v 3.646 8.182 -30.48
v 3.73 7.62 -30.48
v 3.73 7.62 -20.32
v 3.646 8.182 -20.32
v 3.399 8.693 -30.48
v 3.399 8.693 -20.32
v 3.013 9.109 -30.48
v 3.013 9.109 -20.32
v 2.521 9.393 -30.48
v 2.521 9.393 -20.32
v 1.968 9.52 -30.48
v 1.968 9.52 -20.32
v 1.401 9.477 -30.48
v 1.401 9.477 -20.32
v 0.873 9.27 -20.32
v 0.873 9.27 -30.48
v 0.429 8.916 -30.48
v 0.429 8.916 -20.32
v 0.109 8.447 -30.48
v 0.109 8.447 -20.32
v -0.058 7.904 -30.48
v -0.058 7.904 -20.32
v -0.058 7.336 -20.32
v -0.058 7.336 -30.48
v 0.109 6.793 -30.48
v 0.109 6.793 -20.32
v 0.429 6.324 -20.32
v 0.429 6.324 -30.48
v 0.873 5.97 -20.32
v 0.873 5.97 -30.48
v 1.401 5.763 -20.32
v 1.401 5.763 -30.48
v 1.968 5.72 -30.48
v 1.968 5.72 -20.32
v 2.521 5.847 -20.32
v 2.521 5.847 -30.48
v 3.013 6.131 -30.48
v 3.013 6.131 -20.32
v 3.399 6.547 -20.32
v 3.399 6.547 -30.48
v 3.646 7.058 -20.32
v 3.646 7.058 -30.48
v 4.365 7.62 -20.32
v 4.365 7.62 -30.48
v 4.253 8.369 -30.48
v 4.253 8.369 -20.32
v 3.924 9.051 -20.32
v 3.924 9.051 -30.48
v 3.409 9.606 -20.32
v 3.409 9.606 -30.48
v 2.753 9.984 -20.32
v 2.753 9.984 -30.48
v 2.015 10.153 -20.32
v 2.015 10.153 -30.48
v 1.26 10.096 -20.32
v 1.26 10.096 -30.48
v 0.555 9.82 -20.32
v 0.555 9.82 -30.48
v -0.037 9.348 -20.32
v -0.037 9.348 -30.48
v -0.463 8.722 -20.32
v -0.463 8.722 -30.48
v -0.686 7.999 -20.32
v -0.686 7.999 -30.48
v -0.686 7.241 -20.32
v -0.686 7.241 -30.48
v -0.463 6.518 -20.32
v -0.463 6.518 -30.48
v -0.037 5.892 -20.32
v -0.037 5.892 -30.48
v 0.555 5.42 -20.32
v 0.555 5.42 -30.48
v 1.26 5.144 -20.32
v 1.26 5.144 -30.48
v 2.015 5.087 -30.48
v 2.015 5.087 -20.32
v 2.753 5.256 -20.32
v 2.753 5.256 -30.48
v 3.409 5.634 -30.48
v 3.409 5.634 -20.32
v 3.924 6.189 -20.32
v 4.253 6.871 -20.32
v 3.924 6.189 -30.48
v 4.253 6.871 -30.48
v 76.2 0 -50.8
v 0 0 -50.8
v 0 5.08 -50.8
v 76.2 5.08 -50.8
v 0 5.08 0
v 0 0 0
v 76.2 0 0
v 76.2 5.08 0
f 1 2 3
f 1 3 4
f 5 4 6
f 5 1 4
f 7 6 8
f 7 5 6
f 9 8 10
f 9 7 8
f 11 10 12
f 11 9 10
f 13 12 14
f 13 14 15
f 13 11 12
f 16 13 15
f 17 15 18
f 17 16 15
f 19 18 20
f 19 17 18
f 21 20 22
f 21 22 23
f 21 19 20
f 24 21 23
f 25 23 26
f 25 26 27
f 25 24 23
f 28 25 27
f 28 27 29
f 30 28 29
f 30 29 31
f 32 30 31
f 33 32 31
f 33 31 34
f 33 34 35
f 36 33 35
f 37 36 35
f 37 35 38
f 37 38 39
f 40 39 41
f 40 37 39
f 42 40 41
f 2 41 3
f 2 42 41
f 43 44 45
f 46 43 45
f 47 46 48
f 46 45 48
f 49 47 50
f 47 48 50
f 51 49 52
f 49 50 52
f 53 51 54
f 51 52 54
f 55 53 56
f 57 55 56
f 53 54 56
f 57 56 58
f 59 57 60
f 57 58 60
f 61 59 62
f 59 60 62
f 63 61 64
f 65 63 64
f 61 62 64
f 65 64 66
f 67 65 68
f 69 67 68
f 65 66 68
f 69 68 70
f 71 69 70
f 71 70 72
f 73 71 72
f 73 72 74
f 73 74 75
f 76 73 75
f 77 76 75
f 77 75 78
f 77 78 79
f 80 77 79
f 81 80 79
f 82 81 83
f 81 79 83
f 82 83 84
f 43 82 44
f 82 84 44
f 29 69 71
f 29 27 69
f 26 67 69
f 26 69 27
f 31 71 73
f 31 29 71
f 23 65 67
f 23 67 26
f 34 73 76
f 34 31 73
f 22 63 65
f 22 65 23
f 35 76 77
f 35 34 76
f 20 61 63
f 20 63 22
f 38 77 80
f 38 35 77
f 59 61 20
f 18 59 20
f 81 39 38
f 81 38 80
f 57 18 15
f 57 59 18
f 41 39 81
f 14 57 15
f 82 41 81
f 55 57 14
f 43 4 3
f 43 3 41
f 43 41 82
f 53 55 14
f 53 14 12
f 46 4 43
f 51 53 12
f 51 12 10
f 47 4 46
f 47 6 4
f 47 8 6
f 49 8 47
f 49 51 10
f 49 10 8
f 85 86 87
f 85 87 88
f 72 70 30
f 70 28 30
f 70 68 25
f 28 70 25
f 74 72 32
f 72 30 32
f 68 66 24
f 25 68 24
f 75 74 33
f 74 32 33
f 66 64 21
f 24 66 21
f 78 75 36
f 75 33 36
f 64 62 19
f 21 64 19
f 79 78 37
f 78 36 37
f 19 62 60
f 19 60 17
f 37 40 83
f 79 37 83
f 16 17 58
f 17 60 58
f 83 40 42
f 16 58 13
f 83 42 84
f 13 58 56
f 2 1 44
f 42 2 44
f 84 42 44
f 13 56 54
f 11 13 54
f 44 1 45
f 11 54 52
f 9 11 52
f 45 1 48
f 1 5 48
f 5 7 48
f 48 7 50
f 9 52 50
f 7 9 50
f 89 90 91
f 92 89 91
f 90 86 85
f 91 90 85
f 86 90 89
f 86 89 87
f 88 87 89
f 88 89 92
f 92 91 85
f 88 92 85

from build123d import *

# Parameters (mm, degrees)
SKETCH1_W                = 76.2
SKETCH1_H                = 50.8
BOSS_EXTRUDE1_DEPTH      = 5.08
BOSS_EXTRUDE2_DEPTH      = 5.08
BOSS_EXTRUDE2_DEPTH_BACK = 5.08
SKETCH2_R                = 2.54
SKETCH2_R_2              = 1.905


with BuildPart() as part:
    # Sketch1 → Boss-Extrude1 (new body)
    with BuildSketch(Plane(origin=(0, 0, 0), x_dir=(1, 0, 0), z_dir=(0, 1, 0))):
        with Locations((38.1, 25.4)):
            Rectangle(SKETCH1_W, SKETCH1_H)
    extrude(amount=BOSS_EXTRUDE1_DEPTH)


with BuildPart() as body_2:
    # Sketch2 → Boss-Extrude2 (new, two sides: drawn at the far end of the back side and taken through both)
    with BuildSketch(Plane.XY.offset(-25.4).offset(-BOSS_EXTRUDE2_DEPTH_BACK)):
        with Locations((1.825387068, 7.62)):
            Circle(SKETCH2_R)
        with Locations((1.825387068, 7.62)):
            Circle(SKETCH2_R_2, mode=Mode.SUBTRACT)
    extrude(amount=BOSS_EXTRUDE2_DEPTH + BOSS_EXTRUDE2_DEPTH_BACK)


solid = Compound([part.part, body_2.part])
